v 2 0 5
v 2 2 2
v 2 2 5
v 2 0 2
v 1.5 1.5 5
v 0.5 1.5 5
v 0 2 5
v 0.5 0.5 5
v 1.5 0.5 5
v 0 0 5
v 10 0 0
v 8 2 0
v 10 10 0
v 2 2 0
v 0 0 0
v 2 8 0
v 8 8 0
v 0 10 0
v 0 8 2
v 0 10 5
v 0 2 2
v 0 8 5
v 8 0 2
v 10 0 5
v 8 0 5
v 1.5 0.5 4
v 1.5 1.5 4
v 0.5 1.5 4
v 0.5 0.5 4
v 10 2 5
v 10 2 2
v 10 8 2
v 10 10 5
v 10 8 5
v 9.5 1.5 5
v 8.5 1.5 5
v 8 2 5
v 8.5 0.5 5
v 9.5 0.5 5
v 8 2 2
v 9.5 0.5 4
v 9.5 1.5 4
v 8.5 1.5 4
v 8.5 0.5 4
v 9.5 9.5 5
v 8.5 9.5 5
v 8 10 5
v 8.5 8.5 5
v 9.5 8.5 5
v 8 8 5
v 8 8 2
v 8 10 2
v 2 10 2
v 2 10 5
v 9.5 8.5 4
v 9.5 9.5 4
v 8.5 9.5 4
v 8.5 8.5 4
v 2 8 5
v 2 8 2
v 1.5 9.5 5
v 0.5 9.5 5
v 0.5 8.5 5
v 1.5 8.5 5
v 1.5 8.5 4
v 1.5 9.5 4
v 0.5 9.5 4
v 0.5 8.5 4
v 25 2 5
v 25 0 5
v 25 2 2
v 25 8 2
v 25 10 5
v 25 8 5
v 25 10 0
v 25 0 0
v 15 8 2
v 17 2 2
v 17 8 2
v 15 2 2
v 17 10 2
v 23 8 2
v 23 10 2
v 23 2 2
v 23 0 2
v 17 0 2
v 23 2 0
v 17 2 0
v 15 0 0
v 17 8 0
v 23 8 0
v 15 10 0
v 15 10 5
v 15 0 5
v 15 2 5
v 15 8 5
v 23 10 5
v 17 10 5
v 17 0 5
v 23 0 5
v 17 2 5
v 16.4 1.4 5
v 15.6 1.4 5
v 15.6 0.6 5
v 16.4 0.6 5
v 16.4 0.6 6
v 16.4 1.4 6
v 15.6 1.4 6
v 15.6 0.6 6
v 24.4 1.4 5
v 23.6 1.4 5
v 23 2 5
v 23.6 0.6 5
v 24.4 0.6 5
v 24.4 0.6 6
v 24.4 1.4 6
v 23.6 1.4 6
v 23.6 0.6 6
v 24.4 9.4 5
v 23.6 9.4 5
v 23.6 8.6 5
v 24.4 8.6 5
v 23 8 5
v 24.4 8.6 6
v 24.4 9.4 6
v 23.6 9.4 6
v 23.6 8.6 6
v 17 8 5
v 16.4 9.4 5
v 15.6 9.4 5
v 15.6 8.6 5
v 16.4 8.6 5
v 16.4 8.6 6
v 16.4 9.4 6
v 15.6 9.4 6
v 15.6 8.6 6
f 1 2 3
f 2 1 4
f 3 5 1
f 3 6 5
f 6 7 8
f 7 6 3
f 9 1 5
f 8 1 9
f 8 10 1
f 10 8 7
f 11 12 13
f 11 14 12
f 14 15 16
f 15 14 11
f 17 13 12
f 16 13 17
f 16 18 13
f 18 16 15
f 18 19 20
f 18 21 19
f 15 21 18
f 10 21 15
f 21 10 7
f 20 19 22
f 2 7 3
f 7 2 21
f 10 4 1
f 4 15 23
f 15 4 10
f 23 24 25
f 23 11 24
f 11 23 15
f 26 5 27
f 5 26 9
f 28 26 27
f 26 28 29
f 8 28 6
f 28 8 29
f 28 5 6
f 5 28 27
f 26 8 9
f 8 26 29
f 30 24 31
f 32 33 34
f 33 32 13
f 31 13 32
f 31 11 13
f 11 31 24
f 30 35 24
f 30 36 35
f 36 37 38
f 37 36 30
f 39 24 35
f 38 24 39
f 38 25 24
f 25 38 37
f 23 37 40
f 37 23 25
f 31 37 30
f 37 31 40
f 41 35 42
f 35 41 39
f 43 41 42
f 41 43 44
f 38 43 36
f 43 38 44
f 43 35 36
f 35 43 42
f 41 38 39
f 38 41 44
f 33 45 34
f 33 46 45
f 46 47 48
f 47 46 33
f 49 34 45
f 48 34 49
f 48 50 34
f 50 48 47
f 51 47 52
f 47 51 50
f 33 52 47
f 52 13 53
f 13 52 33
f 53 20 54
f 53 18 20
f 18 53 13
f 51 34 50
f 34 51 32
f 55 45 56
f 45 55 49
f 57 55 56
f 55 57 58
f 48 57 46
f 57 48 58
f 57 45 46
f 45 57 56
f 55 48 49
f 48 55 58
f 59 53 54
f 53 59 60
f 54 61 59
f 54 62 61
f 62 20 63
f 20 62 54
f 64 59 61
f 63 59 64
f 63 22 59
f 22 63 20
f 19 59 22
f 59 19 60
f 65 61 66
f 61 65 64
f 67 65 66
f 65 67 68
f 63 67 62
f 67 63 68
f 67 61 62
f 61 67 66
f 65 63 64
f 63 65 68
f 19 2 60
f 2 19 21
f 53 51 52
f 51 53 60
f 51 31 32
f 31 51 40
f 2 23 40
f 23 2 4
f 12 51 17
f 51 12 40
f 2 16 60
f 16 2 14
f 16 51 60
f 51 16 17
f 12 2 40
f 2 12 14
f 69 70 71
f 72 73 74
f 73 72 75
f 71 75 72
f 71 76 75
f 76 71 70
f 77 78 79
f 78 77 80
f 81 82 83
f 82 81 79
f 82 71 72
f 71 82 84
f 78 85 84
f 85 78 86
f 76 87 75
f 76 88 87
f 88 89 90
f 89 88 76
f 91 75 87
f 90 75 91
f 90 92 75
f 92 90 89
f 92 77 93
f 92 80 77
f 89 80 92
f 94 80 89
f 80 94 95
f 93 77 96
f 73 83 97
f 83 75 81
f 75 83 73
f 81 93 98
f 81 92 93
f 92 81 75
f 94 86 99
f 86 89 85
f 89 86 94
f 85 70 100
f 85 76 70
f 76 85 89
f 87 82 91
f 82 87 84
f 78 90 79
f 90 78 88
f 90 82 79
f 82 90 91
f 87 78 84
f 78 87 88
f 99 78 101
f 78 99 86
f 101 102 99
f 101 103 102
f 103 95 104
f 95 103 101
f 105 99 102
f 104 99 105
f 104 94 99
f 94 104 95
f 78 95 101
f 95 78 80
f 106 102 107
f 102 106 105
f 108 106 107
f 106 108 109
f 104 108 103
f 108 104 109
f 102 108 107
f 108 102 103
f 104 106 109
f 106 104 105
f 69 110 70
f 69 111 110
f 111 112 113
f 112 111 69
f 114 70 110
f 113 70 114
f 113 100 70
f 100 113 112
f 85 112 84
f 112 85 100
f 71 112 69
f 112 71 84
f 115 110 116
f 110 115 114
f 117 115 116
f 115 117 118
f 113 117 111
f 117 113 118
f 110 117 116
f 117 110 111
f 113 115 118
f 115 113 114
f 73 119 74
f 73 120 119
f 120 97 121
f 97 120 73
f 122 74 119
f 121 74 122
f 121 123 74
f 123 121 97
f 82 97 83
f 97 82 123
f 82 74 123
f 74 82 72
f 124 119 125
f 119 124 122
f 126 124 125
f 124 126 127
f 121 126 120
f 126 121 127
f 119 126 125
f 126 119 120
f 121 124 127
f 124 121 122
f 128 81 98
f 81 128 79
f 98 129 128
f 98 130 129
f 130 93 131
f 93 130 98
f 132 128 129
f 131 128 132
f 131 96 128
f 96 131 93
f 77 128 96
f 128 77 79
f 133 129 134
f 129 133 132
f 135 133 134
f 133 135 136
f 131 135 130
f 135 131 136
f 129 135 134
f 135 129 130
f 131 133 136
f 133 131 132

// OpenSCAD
dim = 10;
bars = 2;

module half(side){
    pillar(side);
    translate([dim-bars,0,0])
    pillar(side);
    translate([dim-bars,dim-bars,0])
    pillar(side);
    translate([0,dim-bars,0])
    pillar(side);
    difference(){
        cube([dim,dim,bars]);
        translate([bars,bars,0])
        cube([dim-2*bars,dim-2*bars,bars]);
    }
    
    
    

}

half(true);

translate([dim * 1.5,0,0])
half(false);

module pillar(top){
    if(top == true){
        difference(){
            cube([bars,bars,dim/2]);       
            translate([bars/4,bars/4,dim/2 - dim/10])
            cube([bars/2,bars/2,dim/10]);
        }
    }else{
        cube([bars,bars,dim/2]);       
        translate([bars/4 + bars/10/2,bars/4 + bars/10/2,dim/2 ])
        cube([bars/2 - bars/10,bars/2- bars/10,dim/10]);
    }
}
